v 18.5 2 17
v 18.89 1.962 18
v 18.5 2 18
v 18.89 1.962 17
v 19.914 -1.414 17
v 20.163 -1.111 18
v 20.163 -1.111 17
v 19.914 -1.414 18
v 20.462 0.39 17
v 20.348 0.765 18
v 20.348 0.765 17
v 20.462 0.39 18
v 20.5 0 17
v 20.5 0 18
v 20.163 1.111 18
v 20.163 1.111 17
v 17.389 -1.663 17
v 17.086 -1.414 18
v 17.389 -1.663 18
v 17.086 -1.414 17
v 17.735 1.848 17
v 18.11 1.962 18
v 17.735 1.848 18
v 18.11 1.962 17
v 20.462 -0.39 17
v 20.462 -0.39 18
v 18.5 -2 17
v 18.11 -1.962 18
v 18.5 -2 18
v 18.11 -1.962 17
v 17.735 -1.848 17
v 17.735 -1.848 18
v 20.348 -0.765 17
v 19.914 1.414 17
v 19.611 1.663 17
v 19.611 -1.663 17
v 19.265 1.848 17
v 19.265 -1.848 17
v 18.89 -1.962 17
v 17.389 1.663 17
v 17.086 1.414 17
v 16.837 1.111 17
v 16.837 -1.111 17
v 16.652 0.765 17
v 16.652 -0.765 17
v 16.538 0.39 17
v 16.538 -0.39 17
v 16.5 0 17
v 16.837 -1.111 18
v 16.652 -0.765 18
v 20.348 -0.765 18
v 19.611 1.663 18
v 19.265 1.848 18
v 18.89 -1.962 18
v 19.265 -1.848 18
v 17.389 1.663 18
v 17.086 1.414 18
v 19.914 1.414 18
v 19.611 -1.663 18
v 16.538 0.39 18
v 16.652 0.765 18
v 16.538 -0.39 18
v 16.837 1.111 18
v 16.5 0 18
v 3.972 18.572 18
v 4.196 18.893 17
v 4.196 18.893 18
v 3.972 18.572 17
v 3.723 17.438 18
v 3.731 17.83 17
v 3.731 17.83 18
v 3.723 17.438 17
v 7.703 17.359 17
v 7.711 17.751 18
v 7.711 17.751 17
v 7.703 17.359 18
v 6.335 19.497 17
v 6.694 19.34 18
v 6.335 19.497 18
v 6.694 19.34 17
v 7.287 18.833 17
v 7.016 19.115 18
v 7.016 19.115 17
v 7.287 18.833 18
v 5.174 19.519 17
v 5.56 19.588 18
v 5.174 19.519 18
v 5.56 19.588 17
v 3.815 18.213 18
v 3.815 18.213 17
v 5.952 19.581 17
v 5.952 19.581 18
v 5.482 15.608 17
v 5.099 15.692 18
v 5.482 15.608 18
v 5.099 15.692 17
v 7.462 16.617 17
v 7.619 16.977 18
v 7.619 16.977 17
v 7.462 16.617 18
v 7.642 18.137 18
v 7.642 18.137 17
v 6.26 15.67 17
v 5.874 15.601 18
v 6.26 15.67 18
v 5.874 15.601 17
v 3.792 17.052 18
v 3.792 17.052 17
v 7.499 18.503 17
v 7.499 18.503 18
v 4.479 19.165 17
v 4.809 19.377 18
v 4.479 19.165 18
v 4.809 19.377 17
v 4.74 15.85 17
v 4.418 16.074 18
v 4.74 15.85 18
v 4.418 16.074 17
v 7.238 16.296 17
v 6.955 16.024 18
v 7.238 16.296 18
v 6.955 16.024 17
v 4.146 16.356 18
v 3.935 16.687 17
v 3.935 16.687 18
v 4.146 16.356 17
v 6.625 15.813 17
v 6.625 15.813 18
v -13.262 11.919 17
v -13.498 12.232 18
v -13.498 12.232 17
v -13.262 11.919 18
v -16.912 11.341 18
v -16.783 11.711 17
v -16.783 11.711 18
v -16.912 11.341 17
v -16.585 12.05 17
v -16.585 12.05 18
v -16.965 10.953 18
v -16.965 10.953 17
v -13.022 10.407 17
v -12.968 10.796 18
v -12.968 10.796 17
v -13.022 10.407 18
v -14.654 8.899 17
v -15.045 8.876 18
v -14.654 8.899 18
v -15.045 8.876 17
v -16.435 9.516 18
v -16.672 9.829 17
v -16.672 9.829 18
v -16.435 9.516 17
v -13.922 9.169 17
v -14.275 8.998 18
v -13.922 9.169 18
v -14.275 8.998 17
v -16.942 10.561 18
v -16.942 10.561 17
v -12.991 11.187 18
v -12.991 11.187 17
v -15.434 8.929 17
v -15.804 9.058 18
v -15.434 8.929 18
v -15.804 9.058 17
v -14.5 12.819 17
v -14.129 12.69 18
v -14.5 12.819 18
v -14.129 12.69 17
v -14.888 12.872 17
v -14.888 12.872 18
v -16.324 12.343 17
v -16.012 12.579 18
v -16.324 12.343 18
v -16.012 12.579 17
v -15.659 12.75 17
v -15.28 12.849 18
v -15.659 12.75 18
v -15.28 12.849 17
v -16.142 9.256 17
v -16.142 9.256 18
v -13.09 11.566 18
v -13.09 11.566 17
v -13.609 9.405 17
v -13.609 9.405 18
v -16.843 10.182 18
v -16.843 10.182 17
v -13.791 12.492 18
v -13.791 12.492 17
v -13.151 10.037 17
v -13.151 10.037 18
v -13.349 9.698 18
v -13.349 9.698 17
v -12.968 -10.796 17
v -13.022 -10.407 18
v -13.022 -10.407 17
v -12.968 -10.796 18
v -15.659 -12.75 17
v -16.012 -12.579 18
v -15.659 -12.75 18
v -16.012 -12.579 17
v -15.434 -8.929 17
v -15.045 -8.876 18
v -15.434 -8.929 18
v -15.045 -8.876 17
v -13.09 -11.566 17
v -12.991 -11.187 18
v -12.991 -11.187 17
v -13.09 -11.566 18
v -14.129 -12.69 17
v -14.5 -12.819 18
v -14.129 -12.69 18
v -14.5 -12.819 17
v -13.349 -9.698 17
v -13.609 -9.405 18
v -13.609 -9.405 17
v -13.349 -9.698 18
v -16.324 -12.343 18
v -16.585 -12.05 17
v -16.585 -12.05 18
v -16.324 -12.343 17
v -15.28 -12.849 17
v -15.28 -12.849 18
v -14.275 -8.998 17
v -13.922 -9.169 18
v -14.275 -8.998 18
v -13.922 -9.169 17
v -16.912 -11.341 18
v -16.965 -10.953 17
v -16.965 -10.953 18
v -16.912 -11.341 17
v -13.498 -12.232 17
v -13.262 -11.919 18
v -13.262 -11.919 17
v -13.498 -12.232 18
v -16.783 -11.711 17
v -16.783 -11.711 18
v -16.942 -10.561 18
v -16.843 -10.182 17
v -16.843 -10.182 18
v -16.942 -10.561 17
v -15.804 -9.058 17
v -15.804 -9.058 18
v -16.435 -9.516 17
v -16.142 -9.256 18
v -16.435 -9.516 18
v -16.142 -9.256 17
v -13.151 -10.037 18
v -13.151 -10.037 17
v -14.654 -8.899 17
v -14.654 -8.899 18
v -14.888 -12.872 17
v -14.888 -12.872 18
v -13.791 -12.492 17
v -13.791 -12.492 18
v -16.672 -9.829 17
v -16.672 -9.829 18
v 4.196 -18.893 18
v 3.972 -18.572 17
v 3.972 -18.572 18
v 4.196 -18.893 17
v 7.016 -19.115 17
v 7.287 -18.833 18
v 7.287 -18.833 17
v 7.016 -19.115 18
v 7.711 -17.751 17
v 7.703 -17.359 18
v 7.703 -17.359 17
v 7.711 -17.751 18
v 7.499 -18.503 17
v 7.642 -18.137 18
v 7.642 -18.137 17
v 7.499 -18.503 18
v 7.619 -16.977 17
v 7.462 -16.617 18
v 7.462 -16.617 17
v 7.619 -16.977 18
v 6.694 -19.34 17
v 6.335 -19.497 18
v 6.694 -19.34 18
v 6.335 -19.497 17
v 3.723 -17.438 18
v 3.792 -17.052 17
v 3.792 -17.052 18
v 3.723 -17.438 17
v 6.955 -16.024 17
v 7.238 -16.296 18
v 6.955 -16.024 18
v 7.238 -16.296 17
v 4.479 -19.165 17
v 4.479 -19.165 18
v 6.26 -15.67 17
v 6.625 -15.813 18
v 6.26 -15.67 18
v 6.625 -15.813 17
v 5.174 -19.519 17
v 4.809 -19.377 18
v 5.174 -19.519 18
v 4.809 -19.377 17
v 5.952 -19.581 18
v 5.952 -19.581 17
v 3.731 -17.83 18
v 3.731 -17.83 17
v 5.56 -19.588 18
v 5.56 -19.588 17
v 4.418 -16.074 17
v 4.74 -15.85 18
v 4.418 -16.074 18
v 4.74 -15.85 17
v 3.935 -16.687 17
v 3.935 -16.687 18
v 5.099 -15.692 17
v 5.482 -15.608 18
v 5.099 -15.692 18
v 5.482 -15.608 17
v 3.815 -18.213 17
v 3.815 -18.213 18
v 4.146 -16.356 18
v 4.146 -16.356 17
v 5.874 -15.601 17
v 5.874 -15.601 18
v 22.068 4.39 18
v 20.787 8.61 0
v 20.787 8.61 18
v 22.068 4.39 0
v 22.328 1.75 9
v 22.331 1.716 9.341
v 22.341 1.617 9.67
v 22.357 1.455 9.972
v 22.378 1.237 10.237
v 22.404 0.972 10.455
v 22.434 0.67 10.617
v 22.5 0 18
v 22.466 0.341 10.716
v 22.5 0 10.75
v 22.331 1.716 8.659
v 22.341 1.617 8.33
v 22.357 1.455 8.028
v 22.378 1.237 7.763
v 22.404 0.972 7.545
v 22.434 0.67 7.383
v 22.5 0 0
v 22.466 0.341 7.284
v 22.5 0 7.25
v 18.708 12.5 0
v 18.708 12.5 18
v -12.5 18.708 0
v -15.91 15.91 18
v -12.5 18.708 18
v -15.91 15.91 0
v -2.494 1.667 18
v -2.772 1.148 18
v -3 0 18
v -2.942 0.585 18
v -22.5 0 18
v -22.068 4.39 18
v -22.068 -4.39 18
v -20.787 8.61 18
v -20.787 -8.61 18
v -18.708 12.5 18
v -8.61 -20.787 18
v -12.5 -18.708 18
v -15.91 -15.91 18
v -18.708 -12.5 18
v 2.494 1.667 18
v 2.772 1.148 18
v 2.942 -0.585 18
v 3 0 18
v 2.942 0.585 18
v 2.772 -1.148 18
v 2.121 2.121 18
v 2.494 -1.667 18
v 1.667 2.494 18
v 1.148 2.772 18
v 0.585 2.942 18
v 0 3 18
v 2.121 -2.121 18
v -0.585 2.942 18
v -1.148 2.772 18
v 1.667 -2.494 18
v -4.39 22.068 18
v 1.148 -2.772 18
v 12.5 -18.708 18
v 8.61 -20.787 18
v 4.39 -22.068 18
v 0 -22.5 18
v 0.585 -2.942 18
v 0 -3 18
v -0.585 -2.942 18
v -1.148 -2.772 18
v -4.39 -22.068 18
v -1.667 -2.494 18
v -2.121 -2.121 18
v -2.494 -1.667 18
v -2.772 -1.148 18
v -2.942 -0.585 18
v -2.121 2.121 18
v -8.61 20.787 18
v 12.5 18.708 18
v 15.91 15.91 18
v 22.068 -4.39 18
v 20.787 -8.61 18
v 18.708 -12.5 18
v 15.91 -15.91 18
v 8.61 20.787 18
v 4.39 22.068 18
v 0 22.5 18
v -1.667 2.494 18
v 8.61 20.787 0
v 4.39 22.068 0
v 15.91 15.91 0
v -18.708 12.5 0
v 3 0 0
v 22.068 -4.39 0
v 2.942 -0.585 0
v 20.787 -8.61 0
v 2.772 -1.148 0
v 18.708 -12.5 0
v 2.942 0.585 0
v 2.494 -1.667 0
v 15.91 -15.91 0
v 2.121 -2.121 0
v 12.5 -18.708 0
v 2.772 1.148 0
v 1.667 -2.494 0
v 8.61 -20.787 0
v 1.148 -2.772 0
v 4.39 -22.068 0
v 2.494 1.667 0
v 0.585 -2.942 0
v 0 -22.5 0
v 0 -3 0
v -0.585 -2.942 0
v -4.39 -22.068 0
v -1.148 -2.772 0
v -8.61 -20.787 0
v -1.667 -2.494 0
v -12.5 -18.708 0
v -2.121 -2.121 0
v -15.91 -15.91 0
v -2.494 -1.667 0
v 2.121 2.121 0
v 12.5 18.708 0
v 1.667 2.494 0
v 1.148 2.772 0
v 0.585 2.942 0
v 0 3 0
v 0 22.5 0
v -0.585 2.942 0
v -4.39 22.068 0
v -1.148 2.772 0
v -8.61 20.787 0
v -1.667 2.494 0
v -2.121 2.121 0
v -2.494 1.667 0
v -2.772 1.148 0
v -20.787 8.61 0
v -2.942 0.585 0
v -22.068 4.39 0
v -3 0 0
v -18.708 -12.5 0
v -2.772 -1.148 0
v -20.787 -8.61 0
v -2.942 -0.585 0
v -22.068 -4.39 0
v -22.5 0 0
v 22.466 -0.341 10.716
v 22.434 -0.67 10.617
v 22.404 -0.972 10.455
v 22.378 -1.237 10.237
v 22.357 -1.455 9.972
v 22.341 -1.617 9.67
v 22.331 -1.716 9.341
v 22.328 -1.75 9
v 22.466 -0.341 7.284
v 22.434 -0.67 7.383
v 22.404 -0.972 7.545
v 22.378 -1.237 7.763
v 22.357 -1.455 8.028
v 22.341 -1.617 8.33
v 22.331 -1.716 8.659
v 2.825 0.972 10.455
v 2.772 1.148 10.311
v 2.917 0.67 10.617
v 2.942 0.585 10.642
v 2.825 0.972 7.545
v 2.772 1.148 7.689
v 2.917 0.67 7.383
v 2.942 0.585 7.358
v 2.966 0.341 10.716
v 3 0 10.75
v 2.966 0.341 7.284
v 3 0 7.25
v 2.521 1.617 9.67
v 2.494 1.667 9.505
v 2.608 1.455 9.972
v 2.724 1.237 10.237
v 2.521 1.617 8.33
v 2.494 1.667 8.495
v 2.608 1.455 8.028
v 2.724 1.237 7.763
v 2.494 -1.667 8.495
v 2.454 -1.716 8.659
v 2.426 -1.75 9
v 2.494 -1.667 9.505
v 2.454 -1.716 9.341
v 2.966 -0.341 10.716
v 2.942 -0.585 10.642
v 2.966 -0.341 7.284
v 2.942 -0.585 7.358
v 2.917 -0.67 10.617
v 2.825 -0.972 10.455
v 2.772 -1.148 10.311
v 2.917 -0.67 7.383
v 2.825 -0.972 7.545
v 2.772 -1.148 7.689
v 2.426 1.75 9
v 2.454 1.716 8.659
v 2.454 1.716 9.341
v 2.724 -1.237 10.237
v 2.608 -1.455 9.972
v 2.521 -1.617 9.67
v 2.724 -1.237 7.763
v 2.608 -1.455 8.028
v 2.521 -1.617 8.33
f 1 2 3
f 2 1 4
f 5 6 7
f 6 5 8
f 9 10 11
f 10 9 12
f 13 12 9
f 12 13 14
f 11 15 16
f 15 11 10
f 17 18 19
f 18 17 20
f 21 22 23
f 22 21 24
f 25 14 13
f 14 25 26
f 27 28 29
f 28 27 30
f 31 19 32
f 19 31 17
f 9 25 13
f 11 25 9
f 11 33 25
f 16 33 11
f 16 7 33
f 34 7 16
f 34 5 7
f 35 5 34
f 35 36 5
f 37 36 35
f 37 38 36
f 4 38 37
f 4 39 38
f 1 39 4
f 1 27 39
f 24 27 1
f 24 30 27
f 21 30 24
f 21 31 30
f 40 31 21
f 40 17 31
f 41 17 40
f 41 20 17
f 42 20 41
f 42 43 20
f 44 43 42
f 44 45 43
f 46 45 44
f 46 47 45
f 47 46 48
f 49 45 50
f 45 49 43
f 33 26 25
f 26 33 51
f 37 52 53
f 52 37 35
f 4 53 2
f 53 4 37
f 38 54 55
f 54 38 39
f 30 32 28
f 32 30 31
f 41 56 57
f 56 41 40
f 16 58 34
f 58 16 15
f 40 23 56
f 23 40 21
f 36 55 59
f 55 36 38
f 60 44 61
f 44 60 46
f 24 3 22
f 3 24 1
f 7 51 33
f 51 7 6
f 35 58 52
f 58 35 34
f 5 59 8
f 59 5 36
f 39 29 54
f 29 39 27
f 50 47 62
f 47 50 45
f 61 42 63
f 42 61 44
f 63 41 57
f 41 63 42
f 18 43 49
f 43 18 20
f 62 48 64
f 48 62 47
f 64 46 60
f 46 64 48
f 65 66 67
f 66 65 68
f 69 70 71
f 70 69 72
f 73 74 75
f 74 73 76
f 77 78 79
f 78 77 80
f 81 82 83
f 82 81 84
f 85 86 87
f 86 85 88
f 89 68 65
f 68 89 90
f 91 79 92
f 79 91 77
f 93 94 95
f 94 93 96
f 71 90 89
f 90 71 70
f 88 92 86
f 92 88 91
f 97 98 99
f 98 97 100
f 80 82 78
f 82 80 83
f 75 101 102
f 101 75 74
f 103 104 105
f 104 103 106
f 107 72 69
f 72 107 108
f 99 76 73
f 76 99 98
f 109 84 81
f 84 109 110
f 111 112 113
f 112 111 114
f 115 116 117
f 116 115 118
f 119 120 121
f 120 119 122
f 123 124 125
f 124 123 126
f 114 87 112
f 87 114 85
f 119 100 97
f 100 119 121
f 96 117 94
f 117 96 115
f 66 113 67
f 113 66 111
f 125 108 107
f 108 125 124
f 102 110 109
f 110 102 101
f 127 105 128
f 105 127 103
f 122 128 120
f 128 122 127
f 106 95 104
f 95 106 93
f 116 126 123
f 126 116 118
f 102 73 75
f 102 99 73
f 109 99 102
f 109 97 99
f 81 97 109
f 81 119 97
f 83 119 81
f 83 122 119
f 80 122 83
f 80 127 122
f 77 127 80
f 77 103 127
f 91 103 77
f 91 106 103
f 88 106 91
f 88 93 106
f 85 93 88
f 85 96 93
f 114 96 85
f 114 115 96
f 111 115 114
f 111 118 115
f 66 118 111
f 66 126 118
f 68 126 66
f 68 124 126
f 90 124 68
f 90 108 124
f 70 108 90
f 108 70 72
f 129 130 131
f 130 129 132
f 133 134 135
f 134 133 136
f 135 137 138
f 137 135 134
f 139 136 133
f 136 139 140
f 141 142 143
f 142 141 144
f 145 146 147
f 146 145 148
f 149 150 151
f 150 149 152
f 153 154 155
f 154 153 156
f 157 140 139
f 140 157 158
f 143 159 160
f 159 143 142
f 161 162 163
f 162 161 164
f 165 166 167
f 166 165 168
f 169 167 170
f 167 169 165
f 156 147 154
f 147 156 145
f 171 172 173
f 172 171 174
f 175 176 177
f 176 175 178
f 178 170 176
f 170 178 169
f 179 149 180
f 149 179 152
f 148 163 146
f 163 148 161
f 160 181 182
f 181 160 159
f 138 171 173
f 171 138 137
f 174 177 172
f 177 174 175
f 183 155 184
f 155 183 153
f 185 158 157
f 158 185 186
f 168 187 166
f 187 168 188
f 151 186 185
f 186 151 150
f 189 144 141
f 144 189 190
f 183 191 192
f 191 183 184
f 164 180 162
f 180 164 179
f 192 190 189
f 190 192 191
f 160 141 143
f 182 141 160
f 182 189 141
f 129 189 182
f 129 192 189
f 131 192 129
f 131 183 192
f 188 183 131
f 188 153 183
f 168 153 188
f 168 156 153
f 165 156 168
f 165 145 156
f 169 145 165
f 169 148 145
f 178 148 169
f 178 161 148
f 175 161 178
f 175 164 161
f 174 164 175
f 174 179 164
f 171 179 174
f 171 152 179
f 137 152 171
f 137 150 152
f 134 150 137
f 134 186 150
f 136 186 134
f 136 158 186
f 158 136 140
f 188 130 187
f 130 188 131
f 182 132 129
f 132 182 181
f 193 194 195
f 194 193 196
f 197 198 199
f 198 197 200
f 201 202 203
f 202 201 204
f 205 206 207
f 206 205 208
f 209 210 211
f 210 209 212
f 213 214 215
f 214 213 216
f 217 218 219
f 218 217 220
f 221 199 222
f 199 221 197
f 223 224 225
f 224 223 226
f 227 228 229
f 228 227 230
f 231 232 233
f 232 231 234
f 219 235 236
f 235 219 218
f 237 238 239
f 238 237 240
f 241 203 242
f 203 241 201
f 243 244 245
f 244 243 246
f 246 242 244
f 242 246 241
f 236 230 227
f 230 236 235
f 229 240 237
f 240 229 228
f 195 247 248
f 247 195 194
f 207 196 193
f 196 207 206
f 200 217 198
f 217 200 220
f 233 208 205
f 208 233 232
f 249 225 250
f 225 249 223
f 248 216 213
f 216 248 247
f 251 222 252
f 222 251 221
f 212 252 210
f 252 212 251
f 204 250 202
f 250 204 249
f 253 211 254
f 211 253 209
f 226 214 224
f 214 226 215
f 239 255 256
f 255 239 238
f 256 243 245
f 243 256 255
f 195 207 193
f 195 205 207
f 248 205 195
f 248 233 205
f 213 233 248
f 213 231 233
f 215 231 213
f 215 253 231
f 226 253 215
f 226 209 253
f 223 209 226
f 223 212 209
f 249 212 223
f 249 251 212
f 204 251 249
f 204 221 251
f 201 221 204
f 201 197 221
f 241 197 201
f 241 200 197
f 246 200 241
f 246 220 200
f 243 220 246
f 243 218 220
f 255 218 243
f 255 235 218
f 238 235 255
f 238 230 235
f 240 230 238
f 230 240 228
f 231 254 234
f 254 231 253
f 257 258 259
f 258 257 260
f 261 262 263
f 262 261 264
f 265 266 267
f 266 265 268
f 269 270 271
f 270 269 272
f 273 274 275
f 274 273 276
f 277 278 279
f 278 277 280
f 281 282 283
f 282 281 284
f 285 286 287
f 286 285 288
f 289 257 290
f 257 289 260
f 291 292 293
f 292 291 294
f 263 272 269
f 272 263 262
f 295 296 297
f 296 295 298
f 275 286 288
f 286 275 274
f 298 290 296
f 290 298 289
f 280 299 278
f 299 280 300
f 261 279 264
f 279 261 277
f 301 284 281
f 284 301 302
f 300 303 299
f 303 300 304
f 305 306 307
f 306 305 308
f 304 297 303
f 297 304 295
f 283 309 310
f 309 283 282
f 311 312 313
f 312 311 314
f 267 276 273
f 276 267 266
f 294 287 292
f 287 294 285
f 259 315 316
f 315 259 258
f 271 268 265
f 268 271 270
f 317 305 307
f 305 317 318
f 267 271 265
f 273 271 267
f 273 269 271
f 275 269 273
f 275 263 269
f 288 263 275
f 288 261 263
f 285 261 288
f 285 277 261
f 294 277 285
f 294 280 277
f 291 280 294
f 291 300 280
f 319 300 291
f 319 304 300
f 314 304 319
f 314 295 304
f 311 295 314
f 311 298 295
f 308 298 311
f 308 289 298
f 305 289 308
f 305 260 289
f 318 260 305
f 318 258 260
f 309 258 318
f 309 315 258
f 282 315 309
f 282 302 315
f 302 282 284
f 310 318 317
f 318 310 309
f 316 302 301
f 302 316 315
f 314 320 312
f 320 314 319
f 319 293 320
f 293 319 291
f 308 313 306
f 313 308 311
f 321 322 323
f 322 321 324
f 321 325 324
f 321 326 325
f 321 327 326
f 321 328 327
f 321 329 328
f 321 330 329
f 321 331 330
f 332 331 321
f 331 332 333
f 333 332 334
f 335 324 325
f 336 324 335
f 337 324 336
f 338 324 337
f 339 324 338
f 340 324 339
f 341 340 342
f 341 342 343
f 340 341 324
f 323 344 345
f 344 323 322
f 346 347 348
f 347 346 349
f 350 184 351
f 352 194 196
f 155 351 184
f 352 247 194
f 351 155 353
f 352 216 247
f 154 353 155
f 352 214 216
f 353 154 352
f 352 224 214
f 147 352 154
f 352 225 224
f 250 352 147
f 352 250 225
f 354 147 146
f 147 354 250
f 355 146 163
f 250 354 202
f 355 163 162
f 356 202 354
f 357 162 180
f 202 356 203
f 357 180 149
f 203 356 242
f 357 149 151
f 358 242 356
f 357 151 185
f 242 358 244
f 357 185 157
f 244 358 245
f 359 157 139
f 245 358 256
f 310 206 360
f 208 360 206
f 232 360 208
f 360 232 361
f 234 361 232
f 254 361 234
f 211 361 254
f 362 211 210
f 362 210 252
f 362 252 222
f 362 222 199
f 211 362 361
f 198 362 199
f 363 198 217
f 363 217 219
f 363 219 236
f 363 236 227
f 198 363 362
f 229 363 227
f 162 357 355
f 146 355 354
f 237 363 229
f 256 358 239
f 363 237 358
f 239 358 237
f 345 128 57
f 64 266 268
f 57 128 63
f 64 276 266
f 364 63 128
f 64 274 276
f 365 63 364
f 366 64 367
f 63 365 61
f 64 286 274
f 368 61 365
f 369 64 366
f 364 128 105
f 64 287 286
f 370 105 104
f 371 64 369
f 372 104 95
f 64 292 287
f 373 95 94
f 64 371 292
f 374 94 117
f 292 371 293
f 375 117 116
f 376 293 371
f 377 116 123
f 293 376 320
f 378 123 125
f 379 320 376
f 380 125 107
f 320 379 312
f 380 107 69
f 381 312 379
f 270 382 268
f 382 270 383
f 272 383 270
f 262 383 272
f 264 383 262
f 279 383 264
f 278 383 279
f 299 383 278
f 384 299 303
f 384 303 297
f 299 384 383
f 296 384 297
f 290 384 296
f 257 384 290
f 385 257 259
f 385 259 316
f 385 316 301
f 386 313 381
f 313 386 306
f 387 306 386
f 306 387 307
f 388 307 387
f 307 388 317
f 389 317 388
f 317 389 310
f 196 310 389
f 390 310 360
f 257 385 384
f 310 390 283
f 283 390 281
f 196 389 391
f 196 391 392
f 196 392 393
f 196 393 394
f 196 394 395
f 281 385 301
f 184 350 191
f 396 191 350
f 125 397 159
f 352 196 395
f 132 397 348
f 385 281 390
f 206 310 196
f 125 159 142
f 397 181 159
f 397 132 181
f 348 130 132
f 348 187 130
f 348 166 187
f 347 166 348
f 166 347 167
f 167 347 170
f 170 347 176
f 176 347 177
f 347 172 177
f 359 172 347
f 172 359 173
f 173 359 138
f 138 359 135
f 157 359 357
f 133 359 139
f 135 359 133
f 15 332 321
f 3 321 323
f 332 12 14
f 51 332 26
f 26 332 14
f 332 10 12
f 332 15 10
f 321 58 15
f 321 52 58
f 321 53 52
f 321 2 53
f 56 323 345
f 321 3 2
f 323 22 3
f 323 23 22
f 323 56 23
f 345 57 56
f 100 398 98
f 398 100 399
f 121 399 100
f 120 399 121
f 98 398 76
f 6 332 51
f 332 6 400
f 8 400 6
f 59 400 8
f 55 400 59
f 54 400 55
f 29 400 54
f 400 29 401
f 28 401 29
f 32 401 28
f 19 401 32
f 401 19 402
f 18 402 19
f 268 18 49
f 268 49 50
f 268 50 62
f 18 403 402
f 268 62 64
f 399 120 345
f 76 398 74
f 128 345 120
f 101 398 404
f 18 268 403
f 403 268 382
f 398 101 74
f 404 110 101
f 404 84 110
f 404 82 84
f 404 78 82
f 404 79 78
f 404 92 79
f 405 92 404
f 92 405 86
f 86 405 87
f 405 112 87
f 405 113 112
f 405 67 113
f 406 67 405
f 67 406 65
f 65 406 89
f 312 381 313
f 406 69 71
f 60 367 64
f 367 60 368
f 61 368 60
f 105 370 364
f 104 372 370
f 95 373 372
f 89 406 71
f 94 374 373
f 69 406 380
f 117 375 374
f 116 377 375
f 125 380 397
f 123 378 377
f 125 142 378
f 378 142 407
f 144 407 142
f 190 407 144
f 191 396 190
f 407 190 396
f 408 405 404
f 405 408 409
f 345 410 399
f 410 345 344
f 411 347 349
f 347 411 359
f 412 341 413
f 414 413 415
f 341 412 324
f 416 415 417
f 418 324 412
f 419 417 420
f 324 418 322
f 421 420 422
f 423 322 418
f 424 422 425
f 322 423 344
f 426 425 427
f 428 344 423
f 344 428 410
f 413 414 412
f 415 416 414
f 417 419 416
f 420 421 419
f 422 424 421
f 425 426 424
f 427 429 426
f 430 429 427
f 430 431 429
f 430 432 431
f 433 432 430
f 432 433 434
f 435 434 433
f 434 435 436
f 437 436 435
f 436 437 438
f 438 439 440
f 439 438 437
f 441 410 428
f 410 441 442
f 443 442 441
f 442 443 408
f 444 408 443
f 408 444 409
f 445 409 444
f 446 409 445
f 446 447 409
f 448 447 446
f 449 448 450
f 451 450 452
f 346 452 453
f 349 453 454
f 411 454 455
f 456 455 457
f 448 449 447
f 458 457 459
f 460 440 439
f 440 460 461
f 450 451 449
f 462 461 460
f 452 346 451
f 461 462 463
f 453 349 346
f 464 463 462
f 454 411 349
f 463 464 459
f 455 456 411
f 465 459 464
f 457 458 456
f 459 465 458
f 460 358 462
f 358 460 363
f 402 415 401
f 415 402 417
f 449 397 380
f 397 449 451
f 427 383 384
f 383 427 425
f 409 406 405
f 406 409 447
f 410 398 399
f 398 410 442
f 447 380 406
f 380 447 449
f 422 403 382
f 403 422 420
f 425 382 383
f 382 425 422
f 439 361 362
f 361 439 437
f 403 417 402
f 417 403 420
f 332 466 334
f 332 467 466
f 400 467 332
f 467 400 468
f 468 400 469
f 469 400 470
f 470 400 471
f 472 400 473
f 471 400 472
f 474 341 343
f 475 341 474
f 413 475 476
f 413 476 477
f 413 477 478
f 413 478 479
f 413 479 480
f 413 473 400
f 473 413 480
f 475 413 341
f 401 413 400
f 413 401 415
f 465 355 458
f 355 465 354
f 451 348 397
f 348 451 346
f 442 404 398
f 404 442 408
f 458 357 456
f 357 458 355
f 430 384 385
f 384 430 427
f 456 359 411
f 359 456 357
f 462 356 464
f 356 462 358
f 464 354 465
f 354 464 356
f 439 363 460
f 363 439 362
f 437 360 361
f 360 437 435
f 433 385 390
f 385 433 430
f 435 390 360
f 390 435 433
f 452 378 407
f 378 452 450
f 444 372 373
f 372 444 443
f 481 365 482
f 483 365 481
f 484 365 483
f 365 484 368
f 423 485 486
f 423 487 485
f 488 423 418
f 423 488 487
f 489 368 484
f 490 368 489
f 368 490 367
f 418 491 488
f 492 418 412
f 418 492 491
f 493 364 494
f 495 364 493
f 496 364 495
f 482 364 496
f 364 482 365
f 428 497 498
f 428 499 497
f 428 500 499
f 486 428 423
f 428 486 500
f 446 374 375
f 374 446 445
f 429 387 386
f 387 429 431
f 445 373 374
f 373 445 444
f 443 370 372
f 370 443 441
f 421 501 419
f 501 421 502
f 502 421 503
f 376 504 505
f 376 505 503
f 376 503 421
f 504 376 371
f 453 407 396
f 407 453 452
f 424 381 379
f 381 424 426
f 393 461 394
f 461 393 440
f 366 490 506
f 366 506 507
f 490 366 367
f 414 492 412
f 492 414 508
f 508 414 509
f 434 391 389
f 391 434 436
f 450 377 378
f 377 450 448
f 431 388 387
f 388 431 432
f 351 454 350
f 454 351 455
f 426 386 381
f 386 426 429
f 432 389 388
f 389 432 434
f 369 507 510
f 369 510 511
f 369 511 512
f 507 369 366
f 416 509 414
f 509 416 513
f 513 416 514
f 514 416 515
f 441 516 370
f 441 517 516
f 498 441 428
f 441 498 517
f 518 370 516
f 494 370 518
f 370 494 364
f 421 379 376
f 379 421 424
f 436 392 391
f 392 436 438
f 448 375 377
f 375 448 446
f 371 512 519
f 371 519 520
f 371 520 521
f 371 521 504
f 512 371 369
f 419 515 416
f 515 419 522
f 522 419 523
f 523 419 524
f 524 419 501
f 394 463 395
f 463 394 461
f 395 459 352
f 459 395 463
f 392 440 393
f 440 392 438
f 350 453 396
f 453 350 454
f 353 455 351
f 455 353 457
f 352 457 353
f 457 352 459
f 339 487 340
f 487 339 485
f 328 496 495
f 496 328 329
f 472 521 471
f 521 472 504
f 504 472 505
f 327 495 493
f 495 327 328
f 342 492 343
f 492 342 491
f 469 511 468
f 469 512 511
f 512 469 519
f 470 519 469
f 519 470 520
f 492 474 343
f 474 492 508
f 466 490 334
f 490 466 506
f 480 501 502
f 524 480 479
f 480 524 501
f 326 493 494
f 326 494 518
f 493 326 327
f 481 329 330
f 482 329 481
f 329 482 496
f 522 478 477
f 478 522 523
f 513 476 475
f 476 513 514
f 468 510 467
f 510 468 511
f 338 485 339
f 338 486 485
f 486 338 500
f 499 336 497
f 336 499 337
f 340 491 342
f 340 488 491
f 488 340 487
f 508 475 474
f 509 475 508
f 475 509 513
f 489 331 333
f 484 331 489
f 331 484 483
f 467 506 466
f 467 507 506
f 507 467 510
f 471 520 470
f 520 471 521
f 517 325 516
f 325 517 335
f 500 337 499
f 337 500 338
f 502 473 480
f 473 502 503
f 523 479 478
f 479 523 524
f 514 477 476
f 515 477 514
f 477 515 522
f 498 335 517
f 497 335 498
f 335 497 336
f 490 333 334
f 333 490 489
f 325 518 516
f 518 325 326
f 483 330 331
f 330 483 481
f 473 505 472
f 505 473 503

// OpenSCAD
$fn = 32;

// ----------------------------------------------------------------------
// Control knob: dimpled knob
// ----------------------------------------------------------------------

// --- parameters (mm) ---
dimp_d = 4;               // finger dimple diameter
n_dimp = 5;               // number of dimples
dimp_r = 18.5;            // dimple ring radius
knob_d = 45;              // knob body diameter
knob_h = 18;              // knob body height
bore_d = 6;               // shaft bore diameter
set_d = 3.5;              // set screw bore diameter

dimp_step = 360 / n_dimp;  // dimple angular step

difference() {
  cylinder(h = knob_h, d = knob_d);
  translate([0, 0, -1]) cylinder(h = knob_h + 2, d = bore_d);
  translate([-1, 0, knob_h / 2]) rotate([0, 90, 0])
    cylinder(h = knob_d / 2 + bore_d / 2 + 2, d = set_d);  for (i = [0 : n_dimp - 1])
    rotate([0, 0, i * dimp_step])
      translate([dimp_r, 0, knob_h - 1])
        cylinder(h = 2, d = dimp_d);
}
